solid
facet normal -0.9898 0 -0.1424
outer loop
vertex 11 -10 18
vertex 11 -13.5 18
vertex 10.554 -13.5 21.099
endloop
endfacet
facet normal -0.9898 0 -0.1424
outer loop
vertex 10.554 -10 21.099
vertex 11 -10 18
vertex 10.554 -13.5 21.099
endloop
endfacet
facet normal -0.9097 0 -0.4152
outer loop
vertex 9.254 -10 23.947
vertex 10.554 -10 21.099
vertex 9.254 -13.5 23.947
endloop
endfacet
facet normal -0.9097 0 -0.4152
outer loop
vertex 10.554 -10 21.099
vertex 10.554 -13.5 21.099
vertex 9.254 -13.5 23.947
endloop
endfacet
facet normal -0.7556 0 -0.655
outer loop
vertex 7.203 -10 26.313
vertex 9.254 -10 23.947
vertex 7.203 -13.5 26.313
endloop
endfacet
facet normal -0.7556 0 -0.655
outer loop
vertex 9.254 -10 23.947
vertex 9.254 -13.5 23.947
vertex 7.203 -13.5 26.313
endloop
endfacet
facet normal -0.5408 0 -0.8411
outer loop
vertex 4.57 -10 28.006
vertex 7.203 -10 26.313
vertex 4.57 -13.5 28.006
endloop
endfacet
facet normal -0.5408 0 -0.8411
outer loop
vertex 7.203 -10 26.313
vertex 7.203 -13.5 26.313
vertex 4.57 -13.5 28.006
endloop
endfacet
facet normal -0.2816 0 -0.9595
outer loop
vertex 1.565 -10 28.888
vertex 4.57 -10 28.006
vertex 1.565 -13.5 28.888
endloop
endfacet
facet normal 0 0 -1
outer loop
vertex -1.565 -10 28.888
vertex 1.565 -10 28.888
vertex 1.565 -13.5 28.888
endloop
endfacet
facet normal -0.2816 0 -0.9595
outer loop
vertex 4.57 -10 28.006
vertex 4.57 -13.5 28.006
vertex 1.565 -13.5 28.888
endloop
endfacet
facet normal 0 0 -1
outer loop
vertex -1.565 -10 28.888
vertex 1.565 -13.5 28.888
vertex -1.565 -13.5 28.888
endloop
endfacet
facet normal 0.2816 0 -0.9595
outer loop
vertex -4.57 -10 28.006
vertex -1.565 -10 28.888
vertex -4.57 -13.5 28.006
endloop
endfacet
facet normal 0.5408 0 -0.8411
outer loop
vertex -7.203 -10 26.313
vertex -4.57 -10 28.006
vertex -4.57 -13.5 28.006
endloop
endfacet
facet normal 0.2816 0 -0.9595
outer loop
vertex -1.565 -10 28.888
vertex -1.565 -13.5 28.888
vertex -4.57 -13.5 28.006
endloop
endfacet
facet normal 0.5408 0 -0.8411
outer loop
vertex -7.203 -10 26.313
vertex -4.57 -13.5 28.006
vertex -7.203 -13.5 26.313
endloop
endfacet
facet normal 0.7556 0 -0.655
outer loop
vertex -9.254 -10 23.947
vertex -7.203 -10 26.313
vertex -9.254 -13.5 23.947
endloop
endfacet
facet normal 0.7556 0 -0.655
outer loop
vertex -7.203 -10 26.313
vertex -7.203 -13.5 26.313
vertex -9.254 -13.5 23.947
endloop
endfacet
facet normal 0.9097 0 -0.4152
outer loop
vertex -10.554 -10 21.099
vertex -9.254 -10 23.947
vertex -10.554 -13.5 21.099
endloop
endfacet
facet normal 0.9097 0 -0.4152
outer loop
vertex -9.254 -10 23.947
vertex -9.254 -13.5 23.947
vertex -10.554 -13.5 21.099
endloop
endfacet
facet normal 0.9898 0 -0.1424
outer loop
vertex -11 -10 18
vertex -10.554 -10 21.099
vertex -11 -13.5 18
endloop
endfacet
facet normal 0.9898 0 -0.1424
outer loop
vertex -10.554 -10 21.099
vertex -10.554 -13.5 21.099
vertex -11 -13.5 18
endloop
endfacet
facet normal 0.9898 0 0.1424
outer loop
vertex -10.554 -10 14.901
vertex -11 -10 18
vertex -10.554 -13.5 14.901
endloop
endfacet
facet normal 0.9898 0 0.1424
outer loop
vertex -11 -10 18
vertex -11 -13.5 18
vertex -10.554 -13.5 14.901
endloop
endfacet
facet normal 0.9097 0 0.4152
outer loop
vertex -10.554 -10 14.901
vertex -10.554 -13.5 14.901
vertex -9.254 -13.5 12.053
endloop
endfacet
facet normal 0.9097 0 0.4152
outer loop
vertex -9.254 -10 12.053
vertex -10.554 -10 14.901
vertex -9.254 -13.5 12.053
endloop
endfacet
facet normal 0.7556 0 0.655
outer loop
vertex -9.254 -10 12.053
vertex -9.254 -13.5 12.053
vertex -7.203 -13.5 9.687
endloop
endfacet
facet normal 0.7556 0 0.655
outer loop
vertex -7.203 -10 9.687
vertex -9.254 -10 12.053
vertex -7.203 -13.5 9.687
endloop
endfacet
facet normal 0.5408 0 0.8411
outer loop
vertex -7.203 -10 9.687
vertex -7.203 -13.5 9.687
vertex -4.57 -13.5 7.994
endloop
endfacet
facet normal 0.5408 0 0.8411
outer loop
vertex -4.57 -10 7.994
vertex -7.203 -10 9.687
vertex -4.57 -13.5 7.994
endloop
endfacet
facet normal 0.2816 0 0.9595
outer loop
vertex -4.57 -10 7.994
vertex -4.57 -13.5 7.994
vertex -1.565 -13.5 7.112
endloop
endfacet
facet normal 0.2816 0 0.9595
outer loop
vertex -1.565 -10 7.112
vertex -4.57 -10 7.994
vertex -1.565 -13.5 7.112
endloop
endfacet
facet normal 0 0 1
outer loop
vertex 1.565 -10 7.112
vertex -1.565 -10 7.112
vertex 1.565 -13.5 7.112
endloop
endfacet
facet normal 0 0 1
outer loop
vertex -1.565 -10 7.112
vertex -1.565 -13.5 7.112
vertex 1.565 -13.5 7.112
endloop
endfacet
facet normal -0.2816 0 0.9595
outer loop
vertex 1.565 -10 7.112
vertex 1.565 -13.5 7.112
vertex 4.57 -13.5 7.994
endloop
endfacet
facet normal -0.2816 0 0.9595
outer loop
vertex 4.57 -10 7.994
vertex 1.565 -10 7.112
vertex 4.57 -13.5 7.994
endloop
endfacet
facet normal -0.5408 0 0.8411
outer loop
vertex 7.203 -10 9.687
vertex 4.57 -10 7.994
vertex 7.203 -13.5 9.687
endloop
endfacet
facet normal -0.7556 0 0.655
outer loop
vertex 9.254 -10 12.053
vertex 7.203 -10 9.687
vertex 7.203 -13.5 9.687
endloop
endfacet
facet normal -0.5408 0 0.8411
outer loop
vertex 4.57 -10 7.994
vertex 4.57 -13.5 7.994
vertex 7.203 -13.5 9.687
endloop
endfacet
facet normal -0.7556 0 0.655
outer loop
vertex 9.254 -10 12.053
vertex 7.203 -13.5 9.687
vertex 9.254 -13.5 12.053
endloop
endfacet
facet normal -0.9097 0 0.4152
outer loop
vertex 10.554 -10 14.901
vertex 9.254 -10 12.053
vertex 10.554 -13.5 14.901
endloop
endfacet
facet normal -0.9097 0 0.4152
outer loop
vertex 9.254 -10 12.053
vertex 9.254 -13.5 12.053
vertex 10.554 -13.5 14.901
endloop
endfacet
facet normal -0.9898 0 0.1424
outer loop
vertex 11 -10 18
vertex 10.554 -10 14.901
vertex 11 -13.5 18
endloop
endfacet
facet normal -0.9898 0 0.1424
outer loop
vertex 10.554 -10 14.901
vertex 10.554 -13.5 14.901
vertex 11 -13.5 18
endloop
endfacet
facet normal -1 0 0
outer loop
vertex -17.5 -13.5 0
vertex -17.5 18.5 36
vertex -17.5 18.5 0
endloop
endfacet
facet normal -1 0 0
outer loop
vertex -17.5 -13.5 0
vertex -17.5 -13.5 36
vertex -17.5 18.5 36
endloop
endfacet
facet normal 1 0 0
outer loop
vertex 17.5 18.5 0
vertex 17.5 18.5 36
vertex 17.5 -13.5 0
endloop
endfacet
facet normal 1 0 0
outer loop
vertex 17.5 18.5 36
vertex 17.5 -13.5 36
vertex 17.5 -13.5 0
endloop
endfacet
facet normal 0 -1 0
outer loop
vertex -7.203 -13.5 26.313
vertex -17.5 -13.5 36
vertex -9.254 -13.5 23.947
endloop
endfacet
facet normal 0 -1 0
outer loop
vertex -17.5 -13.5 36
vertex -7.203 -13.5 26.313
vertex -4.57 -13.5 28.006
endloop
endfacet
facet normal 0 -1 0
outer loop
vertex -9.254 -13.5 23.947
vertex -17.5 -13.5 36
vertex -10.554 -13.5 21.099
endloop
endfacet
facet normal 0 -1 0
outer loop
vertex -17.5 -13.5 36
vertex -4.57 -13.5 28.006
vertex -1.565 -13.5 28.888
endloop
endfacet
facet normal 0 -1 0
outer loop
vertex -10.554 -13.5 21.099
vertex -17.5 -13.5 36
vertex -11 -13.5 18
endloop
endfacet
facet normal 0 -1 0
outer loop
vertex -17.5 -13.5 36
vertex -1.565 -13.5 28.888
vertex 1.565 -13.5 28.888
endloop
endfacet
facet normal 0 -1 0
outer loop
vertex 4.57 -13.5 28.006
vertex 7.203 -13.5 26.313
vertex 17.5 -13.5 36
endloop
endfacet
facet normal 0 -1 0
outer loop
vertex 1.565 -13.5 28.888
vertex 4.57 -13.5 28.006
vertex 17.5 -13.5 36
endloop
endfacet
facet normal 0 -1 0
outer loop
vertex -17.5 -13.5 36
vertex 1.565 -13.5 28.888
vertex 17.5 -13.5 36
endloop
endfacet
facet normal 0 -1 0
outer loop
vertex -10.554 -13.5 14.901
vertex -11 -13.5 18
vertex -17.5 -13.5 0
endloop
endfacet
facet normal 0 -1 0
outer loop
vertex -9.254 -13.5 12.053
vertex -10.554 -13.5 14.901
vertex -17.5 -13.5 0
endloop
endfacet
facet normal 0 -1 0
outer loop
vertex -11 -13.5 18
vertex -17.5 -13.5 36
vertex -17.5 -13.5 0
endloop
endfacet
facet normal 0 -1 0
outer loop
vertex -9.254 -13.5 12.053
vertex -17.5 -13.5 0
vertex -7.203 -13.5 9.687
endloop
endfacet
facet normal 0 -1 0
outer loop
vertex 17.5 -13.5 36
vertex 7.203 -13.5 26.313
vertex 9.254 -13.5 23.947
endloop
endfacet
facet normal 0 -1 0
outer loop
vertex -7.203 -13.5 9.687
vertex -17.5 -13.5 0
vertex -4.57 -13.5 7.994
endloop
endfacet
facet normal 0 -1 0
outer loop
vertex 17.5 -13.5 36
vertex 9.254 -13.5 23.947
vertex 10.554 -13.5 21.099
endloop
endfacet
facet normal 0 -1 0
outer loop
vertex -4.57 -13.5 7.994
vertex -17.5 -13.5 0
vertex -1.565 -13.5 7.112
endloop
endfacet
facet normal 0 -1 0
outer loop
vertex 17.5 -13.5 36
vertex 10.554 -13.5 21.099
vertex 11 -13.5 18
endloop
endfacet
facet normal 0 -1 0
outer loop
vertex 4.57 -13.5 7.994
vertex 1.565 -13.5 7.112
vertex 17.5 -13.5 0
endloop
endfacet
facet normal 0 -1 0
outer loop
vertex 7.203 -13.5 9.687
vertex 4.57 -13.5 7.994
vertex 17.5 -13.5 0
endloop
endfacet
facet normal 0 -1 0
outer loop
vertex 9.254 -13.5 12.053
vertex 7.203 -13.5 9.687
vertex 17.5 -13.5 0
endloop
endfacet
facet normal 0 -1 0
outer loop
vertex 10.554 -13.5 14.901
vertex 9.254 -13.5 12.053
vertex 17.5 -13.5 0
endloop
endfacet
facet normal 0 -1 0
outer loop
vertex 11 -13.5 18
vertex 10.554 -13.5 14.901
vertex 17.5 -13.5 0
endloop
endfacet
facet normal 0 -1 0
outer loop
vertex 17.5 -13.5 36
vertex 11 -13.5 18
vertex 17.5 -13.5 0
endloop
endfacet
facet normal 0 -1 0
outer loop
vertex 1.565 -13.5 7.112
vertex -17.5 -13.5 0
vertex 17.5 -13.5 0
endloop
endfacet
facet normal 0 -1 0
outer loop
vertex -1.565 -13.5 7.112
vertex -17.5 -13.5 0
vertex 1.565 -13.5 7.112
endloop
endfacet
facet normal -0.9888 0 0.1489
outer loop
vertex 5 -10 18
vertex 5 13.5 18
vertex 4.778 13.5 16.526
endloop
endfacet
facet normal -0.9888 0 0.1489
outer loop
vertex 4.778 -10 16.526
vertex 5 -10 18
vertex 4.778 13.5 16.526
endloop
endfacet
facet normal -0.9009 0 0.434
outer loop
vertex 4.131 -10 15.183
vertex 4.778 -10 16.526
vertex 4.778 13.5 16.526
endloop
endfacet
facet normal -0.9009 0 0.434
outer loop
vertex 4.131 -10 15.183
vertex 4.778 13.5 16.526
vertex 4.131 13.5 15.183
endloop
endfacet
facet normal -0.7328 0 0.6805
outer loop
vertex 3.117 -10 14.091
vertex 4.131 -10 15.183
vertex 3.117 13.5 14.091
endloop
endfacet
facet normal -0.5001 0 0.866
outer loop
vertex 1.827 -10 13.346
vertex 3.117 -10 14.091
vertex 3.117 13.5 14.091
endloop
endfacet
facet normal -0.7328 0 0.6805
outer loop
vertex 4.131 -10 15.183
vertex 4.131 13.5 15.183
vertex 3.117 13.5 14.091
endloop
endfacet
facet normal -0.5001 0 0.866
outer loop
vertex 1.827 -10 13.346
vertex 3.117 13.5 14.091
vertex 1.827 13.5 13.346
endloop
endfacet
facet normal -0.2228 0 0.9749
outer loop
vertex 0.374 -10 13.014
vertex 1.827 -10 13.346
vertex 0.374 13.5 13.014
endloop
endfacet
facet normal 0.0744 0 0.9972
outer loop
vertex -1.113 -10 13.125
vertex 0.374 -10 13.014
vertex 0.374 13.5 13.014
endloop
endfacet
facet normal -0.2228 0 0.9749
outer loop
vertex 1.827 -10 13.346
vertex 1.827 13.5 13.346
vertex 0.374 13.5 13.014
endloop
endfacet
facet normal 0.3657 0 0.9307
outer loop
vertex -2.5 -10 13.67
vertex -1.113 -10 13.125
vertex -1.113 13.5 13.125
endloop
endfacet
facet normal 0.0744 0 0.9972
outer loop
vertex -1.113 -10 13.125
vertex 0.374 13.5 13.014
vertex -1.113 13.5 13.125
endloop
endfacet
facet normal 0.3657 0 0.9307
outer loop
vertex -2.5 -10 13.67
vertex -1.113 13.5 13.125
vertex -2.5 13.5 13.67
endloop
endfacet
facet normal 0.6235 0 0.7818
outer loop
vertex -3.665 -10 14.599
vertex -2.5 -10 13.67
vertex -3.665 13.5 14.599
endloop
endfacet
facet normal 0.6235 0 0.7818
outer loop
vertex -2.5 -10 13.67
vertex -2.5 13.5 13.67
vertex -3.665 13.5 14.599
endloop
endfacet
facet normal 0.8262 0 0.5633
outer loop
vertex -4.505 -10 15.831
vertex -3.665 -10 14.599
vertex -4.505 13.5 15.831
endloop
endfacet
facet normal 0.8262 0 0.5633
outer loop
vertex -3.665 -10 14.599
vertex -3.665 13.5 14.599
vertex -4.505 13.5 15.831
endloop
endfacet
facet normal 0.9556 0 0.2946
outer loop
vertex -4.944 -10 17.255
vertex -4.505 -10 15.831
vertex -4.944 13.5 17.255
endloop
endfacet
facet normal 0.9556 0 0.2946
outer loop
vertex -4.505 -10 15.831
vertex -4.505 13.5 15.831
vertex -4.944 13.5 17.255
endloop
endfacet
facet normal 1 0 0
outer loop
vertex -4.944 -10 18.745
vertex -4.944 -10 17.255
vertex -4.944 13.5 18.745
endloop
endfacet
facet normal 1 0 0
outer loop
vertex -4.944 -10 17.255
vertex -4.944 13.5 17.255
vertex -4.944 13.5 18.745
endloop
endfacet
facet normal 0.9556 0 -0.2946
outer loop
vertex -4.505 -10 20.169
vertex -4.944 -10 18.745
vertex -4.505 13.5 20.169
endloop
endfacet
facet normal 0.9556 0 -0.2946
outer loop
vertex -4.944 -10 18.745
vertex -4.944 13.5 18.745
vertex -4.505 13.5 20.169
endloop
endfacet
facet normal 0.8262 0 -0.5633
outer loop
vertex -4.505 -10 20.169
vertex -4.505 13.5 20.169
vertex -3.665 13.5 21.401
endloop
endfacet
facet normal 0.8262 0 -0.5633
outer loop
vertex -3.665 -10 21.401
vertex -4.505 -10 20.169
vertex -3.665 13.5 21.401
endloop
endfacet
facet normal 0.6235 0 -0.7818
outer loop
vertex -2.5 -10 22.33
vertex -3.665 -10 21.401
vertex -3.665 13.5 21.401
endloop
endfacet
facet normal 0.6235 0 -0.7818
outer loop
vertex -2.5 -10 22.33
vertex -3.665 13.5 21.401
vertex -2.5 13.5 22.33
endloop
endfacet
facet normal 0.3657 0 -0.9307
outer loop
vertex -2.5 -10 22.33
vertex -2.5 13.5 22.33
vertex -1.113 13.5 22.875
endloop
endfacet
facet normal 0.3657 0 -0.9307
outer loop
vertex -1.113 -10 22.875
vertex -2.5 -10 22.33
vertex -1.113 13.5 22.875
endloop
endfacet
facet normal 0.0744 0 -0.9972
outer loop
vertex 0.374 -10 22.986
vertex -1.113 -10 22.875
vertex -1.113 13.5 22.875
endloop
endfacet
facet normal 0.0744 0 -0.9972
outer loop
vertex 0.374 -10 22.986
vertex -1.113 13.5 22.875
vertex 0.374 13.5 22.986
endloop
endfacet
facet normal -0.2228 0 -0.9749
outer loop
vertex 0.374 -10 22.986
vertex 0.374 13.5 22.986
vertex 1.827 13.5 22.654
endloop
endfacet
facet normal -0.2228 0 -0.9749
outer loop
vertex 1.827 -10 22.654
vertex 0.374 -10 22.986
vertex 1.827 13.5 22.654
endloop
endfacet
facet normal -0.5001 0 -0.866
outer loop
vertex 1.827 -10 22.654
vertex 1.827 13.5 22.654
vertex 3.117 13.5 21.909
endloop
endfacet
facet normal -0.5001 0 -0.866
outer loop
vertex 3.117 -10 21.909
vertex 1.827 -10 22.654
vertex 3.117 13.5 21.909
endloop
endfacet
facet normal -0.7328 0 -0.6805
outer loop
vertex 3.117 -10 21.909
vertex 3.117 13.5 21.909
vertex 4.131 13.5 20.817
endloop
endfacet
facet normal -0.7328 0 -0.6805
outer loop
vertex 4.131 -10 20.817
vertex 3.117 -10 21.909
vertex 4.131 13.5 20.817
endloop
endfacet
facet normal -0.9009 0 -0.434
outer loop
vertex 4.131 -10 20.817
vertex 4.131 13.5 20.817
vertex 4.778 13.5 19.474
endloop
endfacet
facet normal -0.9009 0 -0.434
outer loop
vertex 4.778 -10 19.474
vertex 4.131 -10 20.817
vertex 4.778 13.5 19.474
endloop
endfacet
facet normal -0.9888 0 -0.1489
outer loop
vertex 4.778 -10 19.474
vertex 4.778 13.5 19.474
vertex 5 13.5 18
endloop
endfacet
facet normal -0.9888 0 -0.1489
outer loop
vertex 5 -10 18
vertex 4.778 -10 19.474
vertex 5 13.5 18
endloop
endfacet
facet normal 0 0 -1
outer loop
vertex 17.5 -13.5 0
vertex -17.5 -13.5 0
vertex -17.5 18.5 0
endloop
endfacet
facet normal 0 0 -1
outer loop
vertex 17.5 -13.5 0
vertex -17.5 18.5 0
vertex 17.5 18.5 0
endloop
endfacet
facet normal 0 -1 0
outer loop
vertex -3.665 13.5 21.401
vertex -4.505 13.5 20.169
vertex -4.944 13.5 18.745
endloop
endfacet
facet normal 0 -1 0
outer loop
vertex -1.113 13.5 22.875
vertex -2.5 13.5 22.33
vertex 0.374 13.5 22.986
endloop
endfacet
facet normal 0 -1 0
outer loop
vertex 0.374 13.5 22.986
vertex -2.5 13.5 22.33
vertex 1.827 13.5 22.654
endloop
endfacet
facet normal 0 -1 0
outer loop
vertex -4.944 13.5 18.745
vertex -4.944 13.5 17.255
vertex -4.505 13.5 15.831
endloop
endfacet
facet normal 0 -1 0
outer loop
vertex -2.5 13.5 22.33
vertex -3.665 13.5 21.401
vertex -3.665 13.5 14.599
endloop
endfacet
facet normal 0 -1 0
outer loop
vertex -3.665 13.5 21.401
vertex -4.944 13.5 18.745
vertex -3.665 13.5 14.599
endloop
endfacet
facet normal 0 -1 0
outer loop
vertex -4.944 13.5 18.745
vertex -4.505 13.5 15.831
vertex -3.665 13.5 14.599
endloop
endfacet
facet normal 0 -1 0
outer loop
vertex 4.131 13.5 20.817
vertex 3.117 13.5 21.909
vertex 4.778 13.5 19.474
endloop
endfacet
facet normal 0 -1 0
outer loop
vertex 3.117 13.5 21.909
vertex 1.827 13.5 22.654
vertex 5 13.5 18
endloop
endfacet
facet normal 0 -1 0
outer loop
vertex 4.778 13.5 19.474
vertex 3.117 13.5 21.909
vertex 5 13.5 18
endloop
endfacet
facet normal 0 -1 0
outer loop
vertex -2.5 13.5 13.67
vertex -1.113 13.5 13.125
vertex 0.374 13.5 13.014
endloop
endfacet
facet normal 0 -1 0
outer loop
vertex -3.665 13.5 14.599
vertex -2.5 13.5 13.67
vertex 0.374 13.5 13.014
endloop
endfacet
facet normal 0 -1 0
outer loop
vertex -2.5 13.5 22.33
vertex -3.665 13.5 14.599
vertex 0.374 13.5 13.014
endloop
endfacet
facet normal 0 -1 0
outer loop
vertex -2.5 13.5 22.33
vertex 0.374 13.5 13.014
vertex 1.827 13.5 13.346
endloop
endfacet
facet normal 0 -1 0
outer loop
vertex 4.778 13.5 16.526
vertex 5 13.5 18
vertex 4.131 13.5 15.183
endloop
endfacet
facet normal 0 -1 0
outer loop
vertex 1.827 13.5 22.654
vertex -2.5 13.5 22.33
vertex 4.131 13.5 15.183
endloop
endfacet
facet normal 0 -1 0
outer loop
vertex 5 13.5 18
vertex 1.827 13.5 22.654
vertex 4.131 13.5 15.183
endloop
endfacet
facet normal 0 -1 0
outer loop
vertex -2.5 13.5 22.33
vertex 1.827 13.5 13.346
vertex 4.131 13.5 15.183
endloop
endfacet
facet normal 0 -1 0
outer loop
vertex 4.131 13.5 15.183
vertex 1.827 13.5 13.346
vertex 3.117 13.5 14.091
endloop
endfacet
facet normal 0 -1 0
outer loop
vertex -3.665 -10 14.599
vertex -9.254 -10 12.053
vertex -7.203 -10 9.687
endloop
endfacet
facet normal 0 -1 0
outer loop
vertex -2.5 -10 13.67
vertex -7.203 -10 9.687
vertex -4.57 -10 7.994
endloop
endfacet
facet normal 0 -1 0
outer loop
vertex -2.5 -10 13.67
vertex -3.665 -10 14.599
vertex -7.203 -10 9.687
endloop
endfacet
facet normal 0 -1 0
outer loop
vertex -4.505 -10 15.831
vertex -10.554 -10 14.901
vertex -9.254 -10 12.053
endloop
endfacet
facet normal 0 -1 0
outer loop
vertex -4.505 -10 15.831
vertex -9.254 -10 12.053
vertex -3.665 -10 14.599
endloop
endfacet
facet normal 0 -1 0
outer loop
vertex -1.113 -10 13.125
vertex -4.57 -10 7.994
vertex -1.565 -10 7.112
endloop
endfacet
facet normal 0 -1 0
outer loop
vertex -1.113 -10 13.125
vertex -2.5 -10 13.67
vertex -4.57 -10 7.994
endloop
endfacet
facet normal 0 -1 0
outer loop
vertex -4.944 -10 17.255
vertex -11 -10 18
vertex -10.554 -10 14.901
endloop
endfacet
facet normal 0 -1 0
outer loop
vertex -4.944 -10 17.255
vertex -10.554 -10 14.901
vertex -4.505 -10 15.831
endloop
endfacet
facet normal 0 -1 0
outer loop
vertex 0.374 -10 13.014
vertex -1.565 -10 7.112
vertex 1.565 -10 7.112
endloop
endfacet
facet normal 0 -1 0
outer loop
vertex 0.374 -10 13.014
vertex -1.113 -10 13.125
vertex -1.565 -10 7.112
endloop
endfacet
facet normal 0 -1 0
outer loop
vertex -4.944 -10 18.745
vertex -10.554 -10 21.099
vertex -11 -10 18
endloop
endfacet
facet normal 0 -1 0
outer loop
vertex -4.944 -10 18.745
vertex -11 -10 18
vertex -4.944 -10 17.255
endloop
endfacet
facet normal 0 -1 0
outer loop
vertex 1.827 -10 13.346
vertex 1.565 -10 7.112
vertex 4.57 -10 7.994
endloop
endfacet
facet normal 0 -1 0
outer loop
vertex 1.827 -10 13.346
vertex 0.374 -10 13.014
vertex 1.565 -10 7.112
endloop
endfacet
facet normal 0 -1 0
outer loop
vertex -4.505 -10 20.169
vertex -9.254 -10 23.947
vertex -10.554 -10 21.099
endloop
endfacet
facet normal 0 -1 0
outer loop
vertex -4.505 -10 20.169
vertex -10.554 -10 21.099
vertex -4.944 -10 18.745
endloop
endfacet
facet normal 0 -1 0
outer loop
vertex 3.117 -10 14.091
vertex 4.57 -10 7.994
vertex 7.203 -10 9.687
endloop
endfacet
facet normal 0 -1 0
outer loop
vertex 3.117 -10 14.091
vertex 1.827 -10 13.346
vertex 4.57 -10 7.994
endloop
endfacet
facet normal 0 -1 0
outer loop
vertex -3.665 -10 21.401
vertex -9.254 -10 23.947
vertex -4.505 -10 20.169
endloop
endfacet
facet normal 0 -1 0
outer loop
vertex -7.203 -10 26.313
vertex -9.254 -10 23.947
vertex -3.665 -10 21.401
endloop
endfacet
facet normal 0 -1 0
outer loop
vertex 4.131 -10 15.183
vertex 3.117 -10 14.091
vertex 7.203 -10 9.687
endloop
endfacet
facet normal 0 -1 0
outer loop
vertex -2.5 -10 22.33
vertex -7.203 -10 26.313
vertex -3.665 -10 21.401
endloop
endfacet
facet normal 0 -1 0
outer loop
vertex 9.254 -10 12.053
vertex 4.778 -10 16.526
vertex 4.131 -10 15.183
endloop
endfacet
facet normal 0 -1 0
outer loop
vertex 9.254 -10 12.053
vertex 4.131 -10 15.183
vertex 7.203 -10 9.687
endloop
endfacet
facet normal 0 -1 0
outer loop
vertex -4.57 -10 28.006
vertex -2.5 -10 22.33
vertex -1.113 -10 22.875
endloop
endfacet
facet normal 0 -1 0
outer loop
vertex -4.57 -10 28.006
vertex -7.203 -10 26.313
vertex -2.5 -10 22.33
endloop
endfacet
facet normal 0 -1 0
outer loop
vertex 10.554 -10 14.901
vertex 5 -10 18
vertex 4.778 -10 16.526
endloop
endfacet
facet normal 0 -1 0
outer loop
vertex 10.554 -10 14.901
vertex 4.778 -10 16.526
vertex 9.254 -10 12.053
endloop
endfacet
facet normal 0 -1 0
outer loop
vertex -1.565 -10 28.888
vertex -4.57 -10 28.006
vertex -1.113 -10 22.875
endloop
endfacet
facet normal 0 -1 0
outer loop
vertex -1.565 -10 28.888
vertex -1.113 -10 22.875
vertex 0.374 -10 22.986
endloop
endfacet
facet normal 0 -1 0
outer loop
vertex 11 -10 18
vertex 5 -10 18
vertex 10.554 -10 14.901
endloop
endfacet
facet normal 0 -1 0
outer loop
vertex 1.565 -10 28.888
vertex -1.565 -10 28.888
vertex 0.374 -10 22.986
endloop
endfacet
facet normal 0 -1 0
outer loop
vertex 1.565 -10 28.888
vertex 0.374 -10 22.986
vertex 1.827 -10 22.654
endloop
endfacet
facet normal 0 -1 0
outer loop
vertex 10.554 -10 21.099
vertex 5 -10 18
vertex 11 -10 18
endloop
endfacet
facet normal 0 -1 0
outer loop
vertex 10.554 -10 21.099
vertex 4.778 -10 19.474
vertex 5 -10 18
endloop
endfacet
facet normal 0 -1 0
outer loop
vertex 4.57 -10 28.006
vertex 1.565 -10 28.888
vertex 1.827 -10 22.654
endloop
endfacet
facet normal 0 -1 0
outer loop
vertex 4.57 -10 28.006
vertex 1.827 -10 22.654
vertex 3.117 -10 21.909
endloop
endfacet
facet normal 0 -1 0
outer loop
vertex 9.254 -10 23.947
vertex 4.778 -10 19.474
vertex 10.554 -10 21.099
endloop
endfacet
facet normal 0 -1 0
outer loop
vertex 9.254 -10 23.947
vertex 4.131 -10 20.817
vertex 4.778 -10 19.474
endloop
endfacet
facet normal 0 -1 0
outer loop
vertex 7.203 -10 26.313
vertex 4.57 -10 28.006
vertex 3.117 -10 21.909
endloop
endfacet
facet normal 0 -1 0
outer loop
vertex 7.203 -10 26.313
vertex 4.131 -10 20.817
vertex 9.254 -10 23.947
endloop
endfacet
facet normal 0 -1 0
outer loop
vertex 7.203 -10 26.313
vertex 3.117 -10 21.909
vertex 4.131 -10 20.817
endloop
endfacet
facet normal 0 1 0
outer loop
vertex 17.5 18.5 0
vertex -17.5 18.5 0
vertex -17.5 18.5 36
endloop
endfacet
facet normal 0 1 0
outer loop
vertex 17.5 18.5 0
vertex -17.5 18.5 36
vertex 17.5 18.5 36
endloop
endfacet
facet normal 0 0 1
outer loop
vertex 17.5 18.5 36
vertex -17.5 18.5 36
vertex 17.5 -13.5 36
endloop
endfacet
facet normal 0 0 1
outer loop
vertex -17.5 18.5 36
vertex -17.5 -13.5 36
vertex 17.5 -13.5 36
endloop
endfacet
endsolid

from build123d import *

# Parameters (mm, degrees)
SCHIZZO1_W                   = 35
SCHIZZO1_H                   = 27
ESTRUSIONE_ESTRUSIONE1_DEPTH = 36
SCHIZZO3_R                   = 5
TAGLIO_ESTRUSIONE1_DEPTH     = 28
SCHIZZO4_R                   = 11
TAGLIO_ESTRUSIONE2_DEPTH     = 3.5
SCHIZZO7_W                   = 35
SCHIZZO7_H                   = 36
ESTRUSIONE_ESTRUSIONE3_DEPTH = 5


with BuildPart() as part:
    # Schizzo1 → Estrusione-Estrusione1 (new body)
    with BuildSketch(Plane.XY):
        Rectangle(SCHIZZO1_W, SCHIZZO1_H)
    extrude(amount=ESTRUSIONE_ESTRUSIONE1_DEPTH)

    # Schizzo3 → Taglio-Estrusione1 (cut, through all)
    with BuildSketch(Plane(origin=(0, 13.5, 0), x_dir=(1, 0, 0), z_dir=(0, 1, 0))):
        with Locations((0, -18)):
            Circle(SCHIZZO3_R)
    extrude(amount=-TAGLIO_ESTRUSIONE1_DEPTH, mode=Mode.SUBTRACT)

    # Schizzo4 → Taglio-Estrusione2 (cut)
    with BuildSketch(Plane.XZ.offset(13.5)):
        with Locations((0, 18)):
            Circle(SCHIZZO4_R)
    extrude(amount=-TAGLIO_ESTRUSIONE2_DEPTH, mode=Mode.SUBTRACT)

    # Schizzo7 → Estrusione-Estrusione3 (add)
    with BuildSketch(Plane(origin=(0, 13.5, 0), x_dir=(1, 0, 0), z_dir=(0, 1, 0))):
        with Locations((0, -18)):
            Rectangle(SCHIZZO7_W, SCHIZZO7_H)
    extrude(amount=ESTRUSIONE_ESTRUSIONE3_DEPTH)


solid = part.part
